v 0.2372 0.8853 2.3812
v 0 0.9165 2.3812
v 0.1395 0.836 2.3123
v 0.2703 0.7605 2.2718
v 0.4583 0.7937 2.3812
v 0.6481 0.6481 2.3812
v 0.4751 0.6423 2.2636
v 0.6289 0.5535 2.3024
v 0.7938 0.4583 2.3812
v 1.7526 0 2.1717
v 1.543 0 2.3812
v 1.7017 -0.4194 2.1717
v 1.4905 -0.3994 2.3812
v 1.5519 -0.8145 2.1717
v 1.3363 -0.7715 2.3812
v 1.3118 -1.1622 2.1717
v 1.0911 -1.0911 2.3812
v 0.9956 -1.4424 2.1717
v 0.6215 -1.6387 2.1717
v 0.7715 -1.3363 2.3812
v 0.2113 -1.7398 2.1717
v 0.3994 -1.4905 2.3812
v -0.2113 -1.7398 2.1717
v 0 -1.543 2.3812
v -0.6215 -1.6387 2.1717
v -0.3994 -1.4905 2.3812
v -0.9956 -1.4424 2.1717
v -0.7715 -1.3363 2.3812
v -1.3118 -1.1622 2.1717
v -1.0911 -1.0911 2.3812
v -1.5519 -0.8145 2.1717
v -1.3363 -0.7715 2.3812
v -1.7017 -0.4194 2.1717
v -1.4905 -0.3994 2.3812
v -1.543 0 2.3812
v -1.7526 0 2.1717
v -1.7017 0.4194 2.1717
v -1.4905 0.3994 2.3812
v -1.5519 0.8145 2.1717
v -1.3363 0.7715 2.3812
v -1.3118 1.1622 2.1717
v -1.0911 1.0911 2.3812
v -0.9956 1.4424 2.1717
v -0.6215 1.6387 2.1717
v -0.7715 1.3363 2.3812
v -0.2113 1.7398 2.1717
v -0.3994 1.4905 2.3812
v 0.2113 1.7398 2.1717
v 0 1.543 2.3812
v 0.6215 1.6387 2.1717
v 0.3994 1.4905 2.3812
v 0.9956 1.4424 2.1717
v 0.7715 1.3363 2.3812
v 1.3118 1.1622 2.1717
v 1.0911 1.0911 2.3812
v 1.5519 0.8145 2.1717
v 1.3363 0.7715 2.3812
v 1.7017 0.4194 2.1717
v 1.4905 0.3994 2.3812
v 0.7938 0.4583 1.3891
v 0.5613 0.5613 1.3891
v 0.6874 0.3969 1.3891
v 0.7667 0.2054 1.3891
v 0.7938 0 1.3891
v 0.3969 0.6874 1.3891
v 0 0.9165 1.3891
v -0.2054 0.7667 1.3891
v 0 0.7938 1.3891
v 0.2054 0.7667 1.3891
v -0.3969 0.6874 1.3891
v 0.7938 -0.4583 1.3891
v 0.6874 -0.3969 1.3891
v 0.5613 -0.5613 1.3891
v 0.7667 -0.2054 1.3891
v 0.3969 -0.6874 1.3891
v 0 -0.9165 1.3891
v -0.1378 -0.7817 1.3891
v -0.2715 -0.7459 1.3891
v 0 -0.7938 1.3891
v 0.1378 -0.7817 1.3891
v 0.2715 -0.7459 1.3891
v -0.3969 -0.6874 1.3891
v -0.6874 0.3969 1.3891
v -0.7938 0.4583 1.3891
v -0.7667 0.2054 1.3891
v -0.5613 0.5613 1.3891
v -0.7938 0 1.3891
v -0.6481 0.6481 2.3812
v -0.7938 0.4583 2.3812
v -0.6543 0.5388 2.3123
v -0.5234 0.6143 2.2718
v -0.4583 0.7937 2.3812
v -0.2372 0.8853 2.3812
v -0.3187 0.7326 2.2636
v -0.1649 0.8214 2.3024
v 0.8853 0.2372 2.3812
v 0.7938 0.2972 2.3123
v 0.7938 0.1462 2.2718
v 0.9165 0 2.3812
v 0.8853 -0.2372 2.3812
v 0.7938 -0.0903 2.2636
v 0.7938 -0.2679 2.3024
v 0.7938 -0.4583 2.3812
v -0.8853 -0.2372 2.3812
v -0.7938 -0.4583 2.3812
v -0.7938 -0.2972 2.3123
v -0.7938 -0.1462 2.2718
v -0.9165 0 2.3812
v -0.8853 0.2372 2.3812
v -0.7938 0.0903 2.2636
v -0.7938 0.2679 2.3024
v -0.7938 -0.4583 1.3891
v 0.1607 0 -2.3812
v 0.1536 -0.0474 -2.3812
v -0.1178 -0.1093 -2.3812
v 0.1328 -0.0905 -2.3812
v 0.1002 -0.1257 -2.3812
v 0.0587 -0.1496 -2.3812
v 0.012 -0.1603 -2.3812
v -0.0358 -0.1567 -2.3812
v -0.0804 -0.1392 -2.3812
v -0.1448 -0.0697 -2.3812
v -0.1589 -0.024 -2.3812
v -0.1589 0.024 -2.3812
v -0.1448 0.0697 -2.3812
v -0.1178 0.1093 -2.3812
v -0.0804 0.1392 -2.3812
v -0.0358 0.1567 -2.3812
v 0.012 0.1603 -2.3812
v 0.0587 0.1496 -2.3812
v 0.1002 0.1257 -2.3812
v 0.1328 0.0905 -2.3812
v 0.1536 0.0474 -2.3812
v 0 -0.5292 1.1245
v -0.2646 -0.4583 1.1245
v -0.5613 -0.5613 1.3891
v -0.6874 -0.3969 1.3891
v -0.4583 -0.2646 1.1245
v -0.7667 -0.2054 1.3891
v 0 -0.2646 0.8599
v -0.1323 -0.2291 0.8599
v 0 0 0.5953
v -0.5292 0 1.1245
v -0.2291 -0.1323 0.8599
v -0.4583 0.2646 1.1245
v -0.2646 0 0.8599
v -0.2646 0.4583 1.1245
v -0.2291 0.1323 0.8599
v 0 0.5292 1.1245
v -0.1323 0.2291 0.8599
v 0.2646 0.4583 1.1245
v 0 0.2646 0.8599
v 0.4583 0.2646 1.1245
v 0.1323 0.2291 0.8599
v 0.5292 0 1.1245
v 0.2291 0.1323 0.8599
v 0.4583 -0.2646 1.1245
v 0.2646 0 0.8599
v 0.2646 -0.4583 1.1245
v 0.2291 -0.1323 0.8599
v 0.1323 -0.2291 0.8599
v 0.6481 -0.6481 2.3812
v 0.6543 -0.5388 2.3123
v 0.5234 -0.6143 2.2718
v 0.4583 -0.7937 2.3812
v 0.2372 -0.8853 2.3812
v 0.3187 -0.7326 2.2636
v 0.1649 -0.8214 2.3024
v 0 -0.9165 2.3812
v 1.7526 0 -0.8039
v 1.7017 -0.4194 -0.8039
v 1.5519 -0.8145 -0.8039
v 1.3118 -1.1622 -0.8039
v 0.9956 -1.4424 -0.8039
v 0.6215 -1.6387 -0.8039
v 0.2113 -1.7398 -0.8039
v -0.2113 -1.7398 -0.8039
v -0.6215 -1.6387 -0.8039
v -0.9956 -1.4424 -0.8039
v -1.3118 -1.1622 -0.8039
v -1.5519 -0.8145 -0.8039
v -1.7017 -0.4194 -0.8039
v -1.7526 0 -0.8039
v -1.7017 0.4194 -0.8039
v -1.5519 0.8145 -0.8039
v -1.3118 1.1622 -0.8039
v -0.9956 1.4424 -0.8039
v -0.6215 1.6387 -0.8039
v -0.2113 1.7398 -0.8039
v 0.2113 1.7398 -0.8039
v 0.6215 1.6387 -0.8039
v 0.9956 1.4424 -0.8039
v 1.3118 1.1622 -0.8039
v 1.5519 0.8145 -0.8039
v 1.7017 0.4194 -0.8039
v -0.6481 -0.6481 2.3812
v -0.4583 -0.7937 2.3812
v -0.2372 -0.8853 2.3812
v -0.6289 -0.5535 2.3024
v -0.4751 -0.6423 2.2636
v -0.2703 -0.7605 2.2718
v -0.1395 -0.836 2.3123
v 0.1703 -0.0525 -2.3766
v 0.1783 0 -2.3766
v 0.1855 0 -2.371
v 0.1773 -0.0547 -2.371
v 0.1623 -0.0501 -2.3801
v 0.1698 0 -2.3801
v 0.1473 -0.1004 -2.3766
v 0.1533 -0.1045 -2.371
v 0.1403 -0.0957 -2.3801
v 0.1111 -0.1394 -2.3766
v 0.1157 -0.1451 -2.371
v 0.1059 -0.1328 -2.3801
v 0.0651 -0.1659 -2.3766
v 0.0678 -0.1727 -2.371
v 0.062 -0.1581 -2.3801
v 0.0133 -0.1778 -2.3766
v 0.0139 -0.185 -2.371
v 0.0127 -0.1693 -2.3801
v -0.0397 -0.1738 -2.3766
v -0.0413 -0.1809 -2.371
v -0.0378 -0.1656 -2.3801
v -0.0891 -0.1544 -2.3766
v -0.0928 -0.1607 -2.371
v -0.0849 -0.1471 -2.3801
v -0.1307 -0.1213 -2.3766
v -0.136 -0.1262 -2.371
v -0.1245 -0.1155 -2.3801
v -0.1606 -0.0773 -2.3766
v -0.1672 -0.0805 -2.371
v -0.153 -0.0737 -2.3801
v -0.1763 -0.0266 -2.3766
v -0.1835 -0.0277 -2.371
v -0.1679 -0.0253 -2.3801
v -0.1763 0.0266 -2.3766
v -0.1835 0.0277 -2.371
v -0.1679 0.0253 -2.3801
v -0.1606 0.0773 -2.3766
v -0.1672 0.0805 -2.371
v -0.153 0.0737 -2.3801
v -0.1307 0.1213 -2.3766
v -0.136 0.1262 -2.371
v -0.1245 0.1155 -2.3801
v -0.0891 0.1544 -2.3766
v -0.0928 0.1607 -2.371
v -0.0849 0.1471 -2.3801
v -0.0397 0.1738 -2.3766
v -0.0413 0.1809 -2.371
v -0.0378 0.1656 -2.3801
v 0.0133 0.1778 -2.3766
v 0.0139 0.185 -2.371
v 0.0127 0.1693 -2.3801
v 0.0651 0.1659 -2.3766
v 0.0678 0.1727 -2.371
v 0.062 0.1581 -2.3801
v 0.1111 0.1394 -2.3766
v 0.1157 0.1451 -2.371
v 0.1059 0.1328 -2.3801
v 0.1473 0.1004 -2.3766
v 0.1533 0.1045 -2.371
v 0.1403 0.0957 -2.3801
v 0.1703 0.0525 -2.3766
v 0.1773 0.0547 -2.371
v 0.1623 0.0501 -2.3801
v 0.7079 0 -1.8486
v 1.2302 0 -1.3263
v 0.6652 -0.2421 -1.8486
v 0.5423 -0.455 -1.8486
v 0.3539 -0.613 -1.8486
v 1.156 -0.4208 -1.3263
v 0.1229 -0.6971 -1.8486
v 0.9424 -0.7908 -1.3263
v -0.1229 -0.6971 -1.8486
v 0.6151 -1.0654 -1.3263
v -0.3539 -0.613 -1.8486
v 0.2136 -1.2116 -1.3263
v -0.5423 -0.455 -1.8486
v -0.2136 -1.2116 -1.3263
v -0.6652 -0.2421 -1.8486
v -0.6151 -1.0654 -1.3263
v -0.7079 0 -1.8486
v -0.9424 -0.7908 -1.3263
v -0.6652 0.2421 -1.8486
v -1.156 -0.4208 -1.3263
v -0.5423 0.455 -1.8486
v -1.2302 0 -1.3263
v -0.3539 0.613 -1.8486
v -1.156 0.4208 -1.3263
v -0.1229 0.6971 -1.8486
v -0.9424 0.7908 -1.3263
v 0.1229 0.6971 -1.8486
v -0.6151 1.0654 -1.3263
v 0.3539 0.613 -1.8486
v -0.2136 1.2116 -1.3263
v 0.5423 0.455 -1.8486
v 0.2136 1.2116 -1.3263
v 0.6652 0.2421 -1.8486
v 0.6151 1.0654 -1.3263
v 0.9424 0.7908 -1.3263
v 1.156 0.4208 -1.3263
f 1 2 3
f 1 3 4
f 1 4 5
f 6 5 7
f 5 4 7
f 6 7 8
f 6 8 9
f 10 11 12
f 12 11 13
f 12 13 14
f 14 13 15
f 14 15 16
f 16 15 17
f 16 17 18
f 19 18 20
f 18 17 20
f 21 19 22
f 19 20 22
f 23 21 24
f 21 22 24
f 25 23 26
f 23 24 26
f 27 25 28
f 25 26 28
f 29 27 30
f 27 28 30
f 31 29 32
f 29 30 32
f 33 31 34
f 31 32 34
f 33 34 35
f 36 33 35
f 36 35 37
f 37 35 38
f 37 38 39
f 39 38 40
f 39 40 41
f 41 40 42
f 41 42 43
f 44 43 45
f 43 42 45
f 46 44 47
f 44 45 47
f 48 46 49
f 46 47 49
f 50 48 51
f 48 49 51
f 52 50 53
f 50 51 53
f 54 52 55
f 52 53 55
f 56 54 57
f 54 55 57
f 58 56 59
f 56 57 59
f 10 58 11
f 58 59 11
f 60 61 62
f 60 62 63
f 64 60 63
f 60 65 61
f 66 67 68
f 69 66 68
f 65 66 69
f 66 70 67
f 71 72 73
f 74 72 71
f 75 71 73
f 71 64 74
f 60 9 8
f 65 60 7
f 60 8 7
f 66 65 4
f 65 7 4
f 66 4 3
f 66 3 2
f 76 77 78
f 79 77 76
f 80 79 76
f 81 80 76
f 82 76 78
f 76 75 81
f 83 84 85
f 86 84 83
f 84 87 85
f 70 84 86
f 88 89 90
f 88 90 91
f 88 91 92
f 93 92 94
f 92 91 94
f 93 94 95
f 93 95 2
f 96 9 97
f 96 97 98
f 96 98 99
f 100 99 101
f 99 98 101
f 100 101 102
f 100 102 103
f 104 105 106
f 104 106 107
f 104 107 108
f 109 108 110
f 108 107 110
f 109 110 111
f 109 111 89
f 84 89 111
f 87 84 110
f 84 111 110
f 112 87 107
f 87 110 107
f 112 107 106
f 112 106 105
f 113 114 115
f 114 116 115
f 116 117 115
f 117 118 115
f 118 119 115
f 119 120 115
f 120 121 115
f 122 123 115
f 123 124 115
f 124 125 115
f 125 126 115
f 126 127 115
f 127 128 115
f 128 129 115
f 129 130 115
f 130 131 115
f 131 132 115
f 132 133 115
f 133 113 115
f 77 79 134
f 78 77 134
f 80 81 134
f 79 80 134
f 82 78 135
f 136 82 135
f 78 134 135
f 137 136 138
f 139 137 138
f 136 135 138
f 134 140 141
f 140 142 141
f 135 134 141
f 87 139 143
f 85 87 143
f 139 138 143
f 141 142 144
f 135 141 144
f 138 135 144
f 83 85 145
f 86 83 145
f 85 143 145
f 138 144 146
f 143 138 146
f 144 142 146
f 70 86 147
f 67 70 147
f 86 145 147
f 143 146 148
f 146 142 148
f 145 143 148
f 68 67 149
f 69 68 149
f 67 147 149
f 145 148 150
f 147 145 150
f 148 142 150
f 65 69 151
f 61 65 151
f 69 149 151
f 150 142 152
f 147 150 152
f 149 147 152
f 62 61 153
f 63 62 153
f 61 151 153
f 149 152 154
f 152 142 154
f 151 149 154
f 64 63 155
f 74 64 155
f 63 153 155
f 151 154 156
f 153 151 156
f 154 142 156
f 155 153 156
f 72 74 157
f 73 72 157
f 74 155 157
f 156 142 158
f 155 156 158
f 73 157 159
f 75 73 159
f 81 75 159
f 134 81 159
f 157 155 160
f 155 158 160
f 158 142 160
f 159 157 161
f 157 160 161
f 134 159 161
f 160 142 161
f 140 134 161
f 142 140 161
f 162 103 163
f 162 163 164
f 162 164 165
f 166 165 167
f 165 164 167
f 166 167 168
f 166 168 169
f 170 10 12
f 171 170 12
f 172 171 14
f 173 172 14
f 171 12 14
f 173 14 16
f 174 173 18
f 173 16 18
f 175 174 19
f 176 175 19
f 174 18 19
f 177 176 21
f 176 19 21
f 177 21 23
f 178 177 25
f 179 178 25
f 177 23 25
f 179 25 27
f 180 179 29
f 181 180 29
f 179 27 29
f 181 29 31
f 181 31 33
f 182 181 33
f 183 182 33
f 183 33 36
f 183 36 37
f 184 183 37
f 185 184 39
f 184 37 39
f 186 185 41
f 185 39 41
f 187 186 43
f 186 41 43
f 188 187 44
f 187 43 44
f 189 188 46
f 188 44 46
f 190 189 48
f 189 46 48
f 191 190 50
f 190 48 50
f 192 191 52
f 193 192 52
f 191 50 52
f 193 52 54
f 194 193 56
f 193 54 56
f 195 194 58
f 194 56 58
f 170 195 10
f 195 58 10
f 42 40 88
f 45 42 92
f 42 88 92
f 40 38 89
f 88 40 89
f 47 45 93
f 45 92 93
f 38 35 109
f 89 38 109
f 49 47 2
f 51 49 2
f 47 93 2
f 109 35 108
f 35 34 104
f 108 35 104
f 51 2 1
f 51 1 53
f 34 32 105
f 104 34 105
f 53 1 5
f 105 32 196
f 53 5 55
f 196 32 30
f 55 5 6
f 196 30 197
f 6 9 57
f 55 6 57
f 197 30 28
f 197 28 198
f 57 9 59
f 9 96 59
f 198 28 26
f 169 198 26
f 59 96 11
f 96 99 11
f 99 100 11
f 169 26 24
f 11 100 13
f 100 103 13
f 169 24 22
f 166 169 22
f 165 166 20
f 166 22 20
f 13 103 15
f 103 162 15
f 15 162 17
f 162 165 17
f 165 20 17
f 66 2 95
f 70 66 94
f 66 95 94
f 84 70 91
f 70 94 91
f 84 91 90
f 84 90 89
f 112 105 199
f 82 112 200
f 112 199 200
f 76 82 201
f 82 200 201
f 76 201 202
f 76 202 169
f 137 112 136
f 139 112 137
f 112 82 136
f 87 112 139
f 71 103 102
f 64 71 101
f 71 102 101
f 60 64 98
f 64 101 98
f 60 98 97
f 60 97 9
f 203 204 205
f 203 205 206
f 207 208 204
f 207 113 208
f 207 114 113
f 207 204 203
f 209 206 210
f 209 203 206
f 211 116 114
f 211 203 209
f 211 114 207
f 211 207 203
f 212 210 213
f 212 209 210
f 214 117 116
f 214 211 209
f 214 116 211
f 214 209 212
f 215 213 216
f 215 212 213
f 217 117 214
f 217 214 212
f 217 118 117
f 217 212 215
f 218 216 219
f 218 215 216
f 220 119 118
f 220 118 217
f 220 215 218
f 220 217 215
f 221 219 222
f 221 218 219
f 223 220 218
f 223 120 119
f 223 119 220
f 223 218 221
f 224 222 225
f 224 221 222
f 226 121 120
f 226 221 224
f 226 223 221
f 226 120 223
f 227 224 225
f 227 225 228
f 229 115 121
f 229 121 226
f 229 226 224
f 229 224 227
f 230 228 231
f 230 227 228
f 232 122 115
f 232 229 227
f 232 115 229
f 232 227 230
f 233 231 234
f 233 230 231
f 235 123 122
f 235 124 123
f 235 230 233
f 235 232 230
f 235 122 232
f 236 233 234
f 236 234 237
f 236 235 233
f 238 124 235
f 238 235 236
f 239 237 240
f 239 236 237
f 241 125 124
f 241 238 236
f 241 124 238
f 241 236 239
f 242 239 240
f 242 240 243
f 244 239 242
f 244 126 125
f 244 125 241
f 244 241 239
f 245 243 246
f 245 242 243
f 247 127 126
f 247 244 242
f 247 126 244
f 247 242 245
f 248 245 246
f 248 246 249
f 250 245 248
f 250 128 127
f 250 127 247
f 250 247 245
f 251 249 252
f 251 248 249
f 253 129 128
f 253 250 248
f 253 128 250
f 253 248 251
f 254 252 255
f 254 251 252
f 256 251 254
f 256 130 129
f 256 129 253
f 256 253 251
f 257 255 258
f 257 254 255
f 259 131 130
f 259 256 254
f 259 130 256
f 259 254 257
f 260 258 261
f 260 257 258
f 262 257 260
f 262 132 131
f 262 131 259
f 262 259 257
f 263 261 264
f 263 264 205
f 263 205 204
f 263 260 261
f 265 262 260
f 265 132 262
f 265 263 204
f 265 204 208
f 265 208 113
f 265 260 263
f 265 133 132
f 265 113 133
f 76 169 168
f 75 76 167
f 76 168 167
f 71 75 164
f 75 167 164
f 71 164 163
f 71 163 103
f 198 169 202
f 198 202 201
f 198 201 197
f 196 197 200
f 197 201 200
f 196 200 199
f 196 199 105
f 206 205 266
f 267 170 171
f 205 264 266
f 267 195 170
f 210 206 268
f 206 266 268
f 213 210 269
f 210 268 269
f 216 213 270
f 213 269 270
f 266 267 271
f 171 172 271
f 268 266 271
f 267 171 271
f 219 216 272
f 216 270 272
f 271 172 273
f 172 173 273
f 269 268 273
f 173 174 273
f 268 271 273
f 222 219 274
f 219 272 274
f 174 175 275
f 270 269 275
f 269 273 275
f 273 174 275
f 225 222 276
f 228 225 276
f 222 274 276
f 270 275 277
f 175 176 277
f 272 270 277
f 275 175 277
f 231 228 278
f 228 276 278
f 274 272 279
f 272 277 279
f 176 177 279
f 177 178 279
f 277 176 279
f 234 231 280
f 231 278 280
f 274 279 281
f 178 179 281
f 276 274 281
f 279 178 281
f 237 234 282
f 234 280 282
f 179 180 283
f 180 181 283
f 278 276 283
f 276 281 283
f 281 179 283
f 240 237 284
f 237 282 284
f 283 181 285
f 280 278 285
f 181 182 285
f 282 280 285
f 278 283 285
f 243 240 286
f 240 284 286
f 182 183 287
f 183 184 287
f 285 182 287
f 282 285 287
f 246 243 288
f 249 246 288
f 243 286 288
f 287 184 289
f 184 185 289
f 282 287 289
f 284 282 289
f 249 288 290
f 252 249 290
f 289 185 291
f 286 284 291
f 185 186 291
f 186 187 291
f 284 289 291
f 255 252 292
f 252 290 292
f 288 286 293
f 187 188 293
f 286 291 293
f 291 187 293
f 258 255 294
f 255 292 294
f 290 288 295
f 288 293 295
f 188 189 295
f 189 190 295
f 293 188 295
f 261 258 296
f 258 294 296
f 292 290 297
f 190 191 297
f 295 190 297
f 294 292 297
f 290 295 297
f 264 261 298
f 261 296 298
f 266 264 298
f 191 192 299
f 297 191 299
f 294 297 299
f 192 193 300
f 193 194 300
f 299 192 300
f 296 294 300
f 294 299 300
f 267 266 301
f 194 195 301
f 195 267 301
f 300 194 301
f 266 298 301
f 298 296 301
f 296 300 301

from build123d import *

# Parameters (mm, degrees)
CHAMFER1_SIZE      = 0.20955
CUT_EXTRUDE1_DEPTH = 0.9921875
FILLET1_R          = 0.035052


with BuildPart() as part:
    # Sketch2 → Revolve1 (revolve)
    with BuildSketch(Plane(origin=(0, 0, 0), x_dir=(0, 0, -1), z_dir=(1, 0, 0))):
        Polygon((-2.38125, 0), (2.38125, 0), (2.38125, 0.17526), (0.80391, 1.7526), (-2.38125, 1.7526), align=None)
    revolve(axis=Axis((0, 0, 2.38125), (0, 0, -1)))

    # Chamfer1
    chamfer1_edges = [part.edges().sort_by_distance(p)[0] for p in [
        (0, -1.7526, 2.38125),
    ]]
    chamfer(chamfer1_edges, length=CHAMFER1_SIZE)

    # Sketch3 → Cut-Extrude1 (cut)
    with BuildSketch(Plane.XY.offset(2.38125)):
        Polygon((0, -0.916543552), (0.79375, -0.458271776), (0.79375, 0.458271776), (0, 0.916543552), (-0.79375, 0.458271776), (-0.79375, -0.458271776), align=None)
    extrude(amount=-CUT_EXTRUDE1_DEPTH, mode=Mode.SUBTRACT)

    # Cut-Extrude2 cone 1 section (through the dimple's axis) → Cut-Extrude2 (revolve, cut)
    with BuildSketch(Plane(origin=(0, 0, 2.38125), x_dir=(0, -1, 0), z_dir=(1, 0, 0))):
        Polygon((0, 0), (0.916543552, 0), (0, 0.916543552), align=None)
    revolve(axis=Axis((0, 0, 2.38125), (0, 0, -1)), mode=Mode.SUBTRACT)

    # Cut-Extrude3 cone 1 section (through the dimple's axis) → Cut-Extrude3 (revolve, cut)
    with BuildSketch(Plane(origin=(0, 0, 1.3890625), x_dir=(0, -1, 0), z_dir=(1, 0, 0))):
        Polygon((0, 0), (0.79375, 0), (0, 0.79375), align=None)
    revolve(axis=Axis((0, 0, 1.3890625), (0, 0, -1)), mode=Mode.SUBTRACT)

    # Fillet1
    fillet1_edges = [part.edges().sort_by_distance(p)[0] for p in [
        (0, -0.17526, -2.38125),
    ]]
    fillet(fillet1_edges, radius=FILLET1_R)


solid = part.part
